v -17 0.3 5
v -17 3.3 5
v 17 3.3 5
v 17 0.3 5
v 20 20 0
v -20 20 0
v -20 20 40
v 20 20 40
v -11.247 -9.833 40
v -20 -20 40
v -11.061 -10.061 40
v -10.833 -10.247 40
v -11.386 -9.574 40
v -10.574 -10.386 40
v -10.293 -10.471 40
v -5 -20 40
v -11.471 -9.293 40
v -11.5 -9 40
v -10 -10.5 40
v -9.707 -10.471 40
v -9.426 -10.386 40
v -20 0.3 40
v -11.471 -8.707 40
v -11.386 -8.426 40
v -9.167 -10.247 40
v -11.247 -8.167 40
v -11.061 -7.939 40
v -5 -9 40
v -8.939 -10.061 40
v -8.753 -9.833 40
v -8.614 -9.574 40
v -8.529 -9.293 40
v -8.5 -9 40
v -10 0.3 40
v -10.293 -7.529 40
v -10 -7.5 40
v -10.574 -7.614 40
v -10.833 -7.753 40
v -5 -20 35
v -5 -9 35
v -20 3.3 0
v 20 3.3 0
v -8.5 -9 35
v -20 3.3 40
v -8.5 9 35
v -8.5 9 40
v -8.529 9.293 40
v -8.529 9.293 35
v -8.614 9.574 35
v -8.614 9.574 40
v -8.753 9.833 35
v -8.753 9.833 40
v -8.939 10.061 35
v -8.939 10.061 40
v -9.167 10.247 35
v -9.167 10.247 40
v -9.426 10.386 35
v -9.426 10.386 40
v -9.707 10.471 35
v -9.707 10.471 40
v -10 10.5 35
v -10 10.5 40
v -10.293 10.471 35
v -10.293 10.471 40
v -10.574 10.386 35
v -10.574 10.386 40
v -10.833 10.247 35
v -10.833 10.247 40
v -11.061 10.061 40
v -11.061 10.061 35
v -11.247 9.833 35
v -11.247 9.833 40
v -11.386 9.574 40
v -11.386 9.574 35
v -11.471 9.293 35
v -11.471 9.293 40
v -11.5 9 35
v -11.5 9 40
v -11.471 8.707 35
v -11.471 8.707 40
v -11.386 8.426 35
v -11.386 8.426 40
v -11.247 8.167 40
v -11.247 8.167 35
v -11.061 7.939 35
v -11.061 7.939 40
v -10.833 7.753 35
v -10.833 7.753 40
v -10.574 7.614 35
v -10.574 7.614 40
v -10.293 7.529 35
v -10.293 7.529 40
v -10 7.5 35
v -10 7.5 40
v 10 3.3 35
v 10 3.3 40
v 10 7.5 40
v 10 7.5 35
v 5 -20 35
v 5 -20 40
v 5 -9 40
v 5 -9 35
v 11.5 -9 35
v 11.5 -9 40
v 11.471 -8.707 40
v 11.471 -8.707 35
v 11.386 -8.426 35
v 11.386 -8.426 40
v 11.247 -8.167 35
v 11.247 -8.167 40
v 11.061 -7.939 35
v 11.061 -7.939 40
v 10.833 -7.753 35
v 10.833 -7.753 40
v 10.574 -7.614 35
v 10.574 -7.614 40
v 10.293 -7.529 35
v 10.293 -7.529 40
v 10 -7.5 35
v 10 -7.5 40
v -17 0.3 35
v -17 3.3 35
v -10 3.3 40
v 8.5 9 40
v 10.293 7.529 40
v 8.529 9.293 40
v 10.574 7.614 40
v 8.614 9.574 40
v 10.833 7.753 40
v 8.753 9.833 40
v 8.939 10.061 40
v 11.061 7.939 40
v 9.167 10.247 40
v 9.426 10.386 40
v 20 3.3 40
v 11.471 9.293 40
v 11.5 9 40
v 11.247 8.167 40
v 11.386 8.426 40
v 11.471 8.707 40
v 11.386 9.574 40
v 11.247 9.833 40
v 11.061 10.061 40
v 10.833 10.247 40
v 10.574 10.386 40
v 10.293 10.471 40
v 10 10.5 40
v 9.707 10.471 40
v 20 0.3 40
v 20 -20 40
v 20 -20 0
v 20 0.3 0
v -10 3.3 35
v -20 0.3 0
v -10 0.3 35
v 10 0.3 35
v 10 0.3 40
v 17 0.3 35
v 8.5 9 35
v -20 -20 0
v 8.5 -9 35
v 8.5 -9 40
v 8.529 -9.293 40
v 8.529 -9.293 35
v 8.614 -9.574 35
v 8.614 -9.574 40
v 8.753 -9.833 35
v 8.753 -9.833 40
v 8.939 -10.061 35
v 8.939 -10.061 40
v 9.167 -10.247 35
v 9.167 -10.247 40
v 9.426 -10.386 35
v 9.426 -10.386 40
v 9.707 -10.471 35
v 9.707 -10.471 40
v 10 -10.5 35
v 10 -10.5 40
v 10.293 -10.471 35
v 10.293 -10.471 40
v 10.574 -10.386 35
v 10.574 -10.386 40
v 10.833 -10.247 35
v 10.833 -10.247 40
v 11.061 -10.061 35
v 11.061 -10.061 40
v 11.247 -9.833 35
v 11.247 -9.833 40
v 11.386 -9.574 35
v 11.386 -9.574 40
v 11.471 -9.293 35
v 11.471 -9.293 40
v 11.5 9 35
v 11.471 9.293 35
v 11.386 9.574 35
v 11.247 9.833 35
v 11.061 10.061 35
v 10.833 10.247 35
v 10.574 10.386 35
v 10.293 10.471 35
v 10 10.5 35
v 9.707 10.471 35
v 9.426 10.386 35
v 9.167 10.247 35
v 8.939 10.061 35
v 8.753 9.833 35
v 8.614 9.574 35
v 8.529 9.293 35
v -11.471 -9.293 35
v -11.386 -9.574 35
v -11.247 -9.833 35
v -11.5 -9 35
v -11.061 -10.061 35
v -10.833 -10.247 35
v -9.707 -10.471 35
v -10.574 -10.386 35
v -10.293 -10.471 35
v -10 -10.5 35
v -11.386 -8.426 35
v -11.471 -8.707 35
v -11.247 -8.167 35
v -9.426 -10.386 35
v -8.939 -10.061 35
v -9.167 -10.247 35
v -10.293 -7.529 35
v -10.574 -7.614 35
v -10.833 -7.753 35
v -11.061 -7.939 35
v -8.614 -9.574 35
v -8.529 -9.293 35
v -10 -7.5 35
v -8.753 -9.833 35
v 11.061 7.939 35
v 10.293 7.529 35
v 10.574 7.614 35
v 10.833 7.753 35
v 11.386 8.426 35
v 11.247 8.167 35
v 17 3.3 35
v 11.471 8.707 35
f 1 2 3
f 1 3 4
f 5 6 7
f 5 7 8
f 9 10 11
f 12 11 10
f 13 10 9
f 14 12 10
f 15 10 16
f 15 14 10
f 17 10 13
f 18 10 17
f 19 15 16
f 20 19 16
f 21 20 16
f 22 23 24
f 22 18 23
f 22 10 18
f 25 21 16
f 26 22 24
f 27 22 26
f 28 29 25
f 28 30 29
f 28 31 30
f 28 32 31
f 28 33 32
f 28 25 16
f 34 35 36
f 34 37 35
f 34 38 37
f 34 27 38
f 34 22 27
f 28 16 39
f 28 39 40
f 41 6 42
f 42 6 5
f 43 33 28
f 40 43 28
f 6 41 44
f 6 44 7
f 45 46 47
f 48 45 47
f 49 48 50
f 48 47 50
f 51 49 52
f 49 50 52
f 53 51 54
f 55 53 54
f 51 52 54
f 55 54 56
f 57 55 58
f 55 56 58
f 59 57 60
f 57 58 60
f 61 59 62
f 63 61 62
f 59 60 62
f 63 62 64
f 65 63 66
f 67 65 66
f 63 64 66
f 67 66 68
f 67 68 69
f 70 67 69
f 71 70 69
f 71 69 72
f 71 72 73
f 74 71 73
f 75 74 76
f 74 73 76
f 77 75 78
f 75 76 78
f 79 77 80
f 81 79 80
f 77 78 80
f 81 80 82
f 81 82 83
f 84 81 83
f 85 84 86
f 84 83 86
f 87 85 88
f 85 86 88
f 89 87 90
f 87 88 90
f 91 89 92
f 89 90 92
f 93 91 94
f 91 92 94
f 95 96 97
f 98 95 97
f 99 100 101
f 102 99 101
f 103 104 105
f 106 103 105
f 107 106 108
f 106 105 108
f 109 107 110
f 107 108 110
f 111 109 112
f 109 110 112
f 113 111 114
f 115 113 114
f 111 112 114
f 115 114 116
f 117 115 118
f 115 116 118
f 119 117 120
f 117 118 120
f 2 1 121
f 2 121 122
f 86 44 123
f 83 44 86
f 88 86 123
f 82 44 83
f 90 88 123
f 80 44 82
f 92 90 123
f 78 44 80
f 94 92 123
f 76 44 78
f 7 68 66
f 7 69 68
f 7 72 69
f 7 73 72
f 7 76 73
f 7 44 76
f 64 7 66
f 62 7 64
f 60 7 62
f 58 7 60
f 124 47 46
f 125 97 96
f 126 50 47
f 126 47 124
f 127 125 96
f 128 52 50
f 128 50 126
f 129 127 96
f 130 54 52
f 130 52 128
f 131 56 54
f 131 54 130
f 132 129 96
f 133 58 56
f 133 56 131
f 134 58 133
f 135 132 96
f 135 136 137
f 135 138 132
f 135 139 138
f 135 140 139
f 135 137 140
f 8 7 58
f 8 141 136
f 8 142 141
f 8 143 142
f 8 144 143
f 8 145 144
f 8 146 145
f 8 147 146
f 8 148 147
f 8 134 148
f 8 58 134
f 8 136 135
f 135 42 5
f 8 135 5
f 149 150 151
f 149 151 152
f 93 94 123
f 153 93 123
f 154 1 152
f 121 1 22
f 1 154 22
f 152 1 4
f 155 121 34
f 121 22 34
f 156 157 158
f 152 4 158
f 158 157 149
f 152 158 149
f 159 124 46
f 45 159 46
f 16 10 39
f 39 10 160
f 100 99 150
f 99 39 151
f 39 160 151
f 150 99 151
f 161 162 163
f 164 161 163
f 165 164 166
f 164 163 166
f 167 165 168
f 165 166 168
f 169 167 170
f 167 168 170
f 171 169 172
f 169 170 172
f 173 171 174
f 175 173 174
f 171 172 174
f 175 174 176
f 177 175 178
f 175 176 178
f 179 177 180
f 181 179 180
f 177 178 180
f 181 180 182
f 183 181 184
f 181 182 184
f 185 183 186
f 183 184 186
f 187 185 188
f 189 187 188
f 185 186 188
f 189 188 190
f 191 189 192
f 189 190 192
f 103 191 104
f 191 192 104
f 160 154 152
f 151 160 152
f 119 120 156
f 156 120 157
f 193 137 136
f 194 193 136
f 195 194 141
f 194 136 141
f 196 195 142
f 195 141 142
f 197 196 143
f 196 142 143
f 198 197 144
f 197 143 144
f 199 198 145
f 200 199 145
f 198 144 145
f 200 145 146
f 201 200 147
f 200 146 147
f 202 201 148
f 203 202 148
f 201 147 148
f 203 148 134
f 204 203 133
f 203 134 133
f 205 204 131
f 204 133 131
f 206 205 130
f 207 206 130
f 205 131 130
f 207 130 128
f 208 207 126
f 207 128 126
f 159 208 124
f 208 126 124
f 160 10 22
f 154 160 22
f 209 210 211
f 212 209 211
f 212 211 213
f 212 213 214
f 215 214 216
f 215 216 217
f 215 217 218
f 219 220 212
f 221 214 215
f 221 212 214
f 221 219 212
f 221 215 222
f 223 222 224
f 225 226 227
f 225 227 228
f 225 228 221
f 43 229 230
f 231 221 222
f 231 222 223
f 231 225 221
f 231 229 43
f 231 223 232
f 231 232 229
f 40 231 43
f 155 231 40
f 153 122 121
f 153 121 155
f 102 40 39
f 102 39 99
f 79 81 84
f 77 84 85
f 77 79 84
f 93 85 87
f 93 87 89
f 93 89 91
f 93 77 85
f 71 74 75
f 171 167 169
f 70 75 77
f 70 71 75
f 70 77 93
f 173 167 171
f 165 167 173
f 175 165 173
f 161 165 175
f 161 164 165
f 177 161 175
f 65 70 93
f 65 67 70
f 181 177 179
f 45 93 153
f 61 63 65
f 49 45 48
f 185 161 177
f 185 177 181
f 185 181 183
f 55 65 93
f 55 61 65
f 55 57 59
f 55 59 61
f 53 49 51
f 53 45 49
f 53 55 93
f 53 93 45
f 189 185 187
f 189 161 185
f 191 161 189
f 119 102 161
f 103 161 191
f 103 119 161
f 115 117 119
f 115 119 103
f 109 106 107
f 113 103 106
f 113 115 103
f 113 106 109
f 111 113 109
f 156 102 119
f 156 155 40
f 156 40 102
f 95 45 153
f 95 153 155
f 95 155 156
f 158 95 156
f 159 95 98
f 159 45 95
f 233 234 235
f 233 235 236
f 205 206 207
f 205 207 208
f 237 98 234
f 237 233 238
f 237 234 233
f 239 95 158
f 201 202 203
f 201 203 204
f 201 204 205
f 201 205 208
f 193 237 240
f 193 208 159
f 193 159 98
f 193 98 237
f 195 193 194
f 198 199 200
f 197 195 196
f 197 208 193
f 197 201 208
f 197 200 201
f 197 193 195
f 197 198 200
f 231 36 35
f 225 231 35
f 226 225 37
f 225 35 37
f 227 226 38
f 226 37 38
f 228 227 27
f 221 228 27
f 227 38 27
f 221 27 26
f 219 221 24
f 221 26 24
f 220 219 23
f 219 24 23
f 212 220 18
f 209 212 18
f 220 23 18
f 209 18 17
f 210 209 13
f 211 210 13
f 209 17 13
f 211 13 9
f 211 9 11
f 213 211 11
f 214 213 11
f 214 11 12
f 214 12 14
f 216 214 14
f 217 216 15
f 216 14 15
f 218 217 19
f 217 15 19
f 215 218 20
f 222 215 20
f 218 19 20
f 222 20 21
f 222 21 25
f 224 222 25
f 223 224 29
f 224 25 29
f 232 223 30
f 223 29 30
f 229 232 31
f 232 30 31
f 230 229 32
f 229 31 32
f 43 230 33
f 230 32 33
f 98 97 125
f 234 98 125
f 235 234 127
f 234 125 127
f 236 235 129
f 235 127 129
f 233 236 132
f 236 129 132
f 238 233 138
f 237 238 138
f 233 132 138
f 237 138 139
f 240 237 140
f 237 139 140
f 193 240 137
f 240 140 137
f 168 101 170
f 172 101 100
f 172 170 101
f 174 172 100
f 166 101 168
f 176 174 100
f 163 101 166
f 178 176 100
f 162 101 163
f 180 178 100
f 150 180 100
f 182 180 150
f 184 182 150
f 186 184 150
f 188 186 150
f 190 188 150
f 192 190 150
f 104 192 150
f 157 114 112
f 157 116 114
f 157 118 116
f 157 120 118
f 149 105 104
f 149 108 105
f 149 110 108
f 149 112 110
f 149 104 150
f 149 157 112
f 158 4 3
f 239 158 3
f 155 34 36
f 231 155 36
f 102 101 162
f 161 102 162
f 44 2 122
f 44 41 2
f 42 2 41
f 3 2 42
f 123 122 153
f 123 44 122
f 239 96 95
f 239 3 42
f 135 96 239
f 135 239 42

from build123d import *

# Parameters (mm, degrees)
F0_W     = 40
F0_H     = 40
F1_DEPTH = 40
F2_W     = 10
F2_H     = 11
F3_DEPTH = 5
F4_W     = 3
F4_H     = 3
F5_DEPTH = 40.001
F6_W     = 3
F6_H     = 5
F7_DEPTH = 40.001


with BuildPart() as f1:
    # F0 (on Top) → F1 (new body)
    with BuildSketch(Plane.XY):
        Rectangle(F0_W, F0_H)
    extrude(amount=F1_DEPTH)

    # F2 (on face) → F3 (cut)
    with BuildSketch(Plane.XY.offset(40)):
        with BuildLine():
            ThreePointArc((-10, 7.5), (-8.9393398282, 7.9393398282), (-8.5, 9))
            Line((-8.5, 9), (-10, 9))
            Line((-10, 9), (-10, 7.5))
        make_face()
        with BuildLine():
            Line((-10, 9), (-8.5, 9))
            ThreePointArc((-8.5, 9), (-11.0606601718, 10.0606601718), (-10, 7.5))
            Line((-10, 7.5), (-10, 9))
        make_face()
        with BuildLine():
            Line((8.5, 9), (-8.5, 9))
            ThreePointArc((-8.5, 9), (-8.9393398282, 7.9393398282), (-10, 7.5))
            Line((-10, 7.5), (-10, -7.5))
            ThreePointArc((-10, -7.5), (-8.9393398282, -7.9393398282), (-8.5, -9))
            Line((-8.5, -9), (-5, -9))
            Line((-5, -9), (5, -9))
            Line((5, -9), (8.5, -9))
            ThreePointArc((8.5, -9), (8.9393398282, -7.9393398282), (10, -7.5))
            Line((10, -7.5), (10, 7.5))
            ThreePointArc((10, 7.5), (8.9393398282, 7.9393398282), (8.5, 9))
        make_face()
        with BuildLine():
            ThreePointArc((11.5, 9), (10, 10.5), (8.5, 9))
            Line((8.5, 9), (10, 9))
            Line((10, 9), (10, 7.5))
            ThreePointArc((10, 7.5), (11.0606601718, 7.9393398282), (11.5, 9))
        make_face()
        with BuildLine():
            Line((10, 9), (8.5, 9))
            ThreePointArc((8.5, 9), (8.9393398282, 7.9393398282), (10, 7.5))
            Line((10, 7.5), (10, 9))
        make_face()
        with BuildLine():
            ThreePointArc((-8.5, -9), (-8.9393398282, -7.9393398282), (-10, -7.5))
            Line((-10, -7.5), (-10, -9))
            Line((-10, -9), (-8.5, -9))
        make_face()
        with BuildLine():
            Line((-10, -9), (-10, -7.5))
            ThreePointArc((-10, -7.5), (-11.0606601718, -10.0606601718), (-8.5, -9))
            Line((-8.5, -9), (-10, -9))
        make_face()
        with BuildLine():
            ThreePointArc((11.5, -9), (11.0606601718, -7.9393398282), (10, -7.5))
            Line((10, -7.5), (10, -9))
            Line((10, -9), (8.5, -9))
            ThreePointArc((8.5, -9), (10, -10.5), (11.5, -9))
        make_face()
        with BuildLine():
            Line((10, -9), (10, -7.5))
            ThreePointArc((10, -7.5), (8.9393398282, -7.9393398282), (8.5, -9))
            Line((8.5, -9), (10, -9))
        make_face()
        with Locations((0, -14.5)):
            Rectangle(F2_W, F2_H)
    extrude(amount=-F3_DEPTH, mode=Mode.SUBTRACT)

    # F4 (on face) → F5 (cut, through all)
    with BuildSketch(Plane.XY.offset(40)):
        with Locations((-18.5, 1.8)):
            Rectangle(F4_W, F4_H)
        with Locations((18.5, 1.8)):
            Rectangle(F4_W, F4_H)
    extrude(amount=-F5_DEPTH, mode=Mode.SUBTRACT)

    # F6 (on face) → F7 (cut, through all)
    with BuildSketch(Plane(origin=(-20, 0, 0), x_dir=(0, -1, 0), z_dir=(-1, 0, 0))):
        with Locations((-1.8, 37.5)):
            Rectangle(F6_W, F6_H)
        with Locations((-1.8, 2.5)):
            Rectangle(F6_W, F6_H)
    extrude(amount=-F7_DEPTH, mode=Mode.SUBTRACT)


solid = f1.part
